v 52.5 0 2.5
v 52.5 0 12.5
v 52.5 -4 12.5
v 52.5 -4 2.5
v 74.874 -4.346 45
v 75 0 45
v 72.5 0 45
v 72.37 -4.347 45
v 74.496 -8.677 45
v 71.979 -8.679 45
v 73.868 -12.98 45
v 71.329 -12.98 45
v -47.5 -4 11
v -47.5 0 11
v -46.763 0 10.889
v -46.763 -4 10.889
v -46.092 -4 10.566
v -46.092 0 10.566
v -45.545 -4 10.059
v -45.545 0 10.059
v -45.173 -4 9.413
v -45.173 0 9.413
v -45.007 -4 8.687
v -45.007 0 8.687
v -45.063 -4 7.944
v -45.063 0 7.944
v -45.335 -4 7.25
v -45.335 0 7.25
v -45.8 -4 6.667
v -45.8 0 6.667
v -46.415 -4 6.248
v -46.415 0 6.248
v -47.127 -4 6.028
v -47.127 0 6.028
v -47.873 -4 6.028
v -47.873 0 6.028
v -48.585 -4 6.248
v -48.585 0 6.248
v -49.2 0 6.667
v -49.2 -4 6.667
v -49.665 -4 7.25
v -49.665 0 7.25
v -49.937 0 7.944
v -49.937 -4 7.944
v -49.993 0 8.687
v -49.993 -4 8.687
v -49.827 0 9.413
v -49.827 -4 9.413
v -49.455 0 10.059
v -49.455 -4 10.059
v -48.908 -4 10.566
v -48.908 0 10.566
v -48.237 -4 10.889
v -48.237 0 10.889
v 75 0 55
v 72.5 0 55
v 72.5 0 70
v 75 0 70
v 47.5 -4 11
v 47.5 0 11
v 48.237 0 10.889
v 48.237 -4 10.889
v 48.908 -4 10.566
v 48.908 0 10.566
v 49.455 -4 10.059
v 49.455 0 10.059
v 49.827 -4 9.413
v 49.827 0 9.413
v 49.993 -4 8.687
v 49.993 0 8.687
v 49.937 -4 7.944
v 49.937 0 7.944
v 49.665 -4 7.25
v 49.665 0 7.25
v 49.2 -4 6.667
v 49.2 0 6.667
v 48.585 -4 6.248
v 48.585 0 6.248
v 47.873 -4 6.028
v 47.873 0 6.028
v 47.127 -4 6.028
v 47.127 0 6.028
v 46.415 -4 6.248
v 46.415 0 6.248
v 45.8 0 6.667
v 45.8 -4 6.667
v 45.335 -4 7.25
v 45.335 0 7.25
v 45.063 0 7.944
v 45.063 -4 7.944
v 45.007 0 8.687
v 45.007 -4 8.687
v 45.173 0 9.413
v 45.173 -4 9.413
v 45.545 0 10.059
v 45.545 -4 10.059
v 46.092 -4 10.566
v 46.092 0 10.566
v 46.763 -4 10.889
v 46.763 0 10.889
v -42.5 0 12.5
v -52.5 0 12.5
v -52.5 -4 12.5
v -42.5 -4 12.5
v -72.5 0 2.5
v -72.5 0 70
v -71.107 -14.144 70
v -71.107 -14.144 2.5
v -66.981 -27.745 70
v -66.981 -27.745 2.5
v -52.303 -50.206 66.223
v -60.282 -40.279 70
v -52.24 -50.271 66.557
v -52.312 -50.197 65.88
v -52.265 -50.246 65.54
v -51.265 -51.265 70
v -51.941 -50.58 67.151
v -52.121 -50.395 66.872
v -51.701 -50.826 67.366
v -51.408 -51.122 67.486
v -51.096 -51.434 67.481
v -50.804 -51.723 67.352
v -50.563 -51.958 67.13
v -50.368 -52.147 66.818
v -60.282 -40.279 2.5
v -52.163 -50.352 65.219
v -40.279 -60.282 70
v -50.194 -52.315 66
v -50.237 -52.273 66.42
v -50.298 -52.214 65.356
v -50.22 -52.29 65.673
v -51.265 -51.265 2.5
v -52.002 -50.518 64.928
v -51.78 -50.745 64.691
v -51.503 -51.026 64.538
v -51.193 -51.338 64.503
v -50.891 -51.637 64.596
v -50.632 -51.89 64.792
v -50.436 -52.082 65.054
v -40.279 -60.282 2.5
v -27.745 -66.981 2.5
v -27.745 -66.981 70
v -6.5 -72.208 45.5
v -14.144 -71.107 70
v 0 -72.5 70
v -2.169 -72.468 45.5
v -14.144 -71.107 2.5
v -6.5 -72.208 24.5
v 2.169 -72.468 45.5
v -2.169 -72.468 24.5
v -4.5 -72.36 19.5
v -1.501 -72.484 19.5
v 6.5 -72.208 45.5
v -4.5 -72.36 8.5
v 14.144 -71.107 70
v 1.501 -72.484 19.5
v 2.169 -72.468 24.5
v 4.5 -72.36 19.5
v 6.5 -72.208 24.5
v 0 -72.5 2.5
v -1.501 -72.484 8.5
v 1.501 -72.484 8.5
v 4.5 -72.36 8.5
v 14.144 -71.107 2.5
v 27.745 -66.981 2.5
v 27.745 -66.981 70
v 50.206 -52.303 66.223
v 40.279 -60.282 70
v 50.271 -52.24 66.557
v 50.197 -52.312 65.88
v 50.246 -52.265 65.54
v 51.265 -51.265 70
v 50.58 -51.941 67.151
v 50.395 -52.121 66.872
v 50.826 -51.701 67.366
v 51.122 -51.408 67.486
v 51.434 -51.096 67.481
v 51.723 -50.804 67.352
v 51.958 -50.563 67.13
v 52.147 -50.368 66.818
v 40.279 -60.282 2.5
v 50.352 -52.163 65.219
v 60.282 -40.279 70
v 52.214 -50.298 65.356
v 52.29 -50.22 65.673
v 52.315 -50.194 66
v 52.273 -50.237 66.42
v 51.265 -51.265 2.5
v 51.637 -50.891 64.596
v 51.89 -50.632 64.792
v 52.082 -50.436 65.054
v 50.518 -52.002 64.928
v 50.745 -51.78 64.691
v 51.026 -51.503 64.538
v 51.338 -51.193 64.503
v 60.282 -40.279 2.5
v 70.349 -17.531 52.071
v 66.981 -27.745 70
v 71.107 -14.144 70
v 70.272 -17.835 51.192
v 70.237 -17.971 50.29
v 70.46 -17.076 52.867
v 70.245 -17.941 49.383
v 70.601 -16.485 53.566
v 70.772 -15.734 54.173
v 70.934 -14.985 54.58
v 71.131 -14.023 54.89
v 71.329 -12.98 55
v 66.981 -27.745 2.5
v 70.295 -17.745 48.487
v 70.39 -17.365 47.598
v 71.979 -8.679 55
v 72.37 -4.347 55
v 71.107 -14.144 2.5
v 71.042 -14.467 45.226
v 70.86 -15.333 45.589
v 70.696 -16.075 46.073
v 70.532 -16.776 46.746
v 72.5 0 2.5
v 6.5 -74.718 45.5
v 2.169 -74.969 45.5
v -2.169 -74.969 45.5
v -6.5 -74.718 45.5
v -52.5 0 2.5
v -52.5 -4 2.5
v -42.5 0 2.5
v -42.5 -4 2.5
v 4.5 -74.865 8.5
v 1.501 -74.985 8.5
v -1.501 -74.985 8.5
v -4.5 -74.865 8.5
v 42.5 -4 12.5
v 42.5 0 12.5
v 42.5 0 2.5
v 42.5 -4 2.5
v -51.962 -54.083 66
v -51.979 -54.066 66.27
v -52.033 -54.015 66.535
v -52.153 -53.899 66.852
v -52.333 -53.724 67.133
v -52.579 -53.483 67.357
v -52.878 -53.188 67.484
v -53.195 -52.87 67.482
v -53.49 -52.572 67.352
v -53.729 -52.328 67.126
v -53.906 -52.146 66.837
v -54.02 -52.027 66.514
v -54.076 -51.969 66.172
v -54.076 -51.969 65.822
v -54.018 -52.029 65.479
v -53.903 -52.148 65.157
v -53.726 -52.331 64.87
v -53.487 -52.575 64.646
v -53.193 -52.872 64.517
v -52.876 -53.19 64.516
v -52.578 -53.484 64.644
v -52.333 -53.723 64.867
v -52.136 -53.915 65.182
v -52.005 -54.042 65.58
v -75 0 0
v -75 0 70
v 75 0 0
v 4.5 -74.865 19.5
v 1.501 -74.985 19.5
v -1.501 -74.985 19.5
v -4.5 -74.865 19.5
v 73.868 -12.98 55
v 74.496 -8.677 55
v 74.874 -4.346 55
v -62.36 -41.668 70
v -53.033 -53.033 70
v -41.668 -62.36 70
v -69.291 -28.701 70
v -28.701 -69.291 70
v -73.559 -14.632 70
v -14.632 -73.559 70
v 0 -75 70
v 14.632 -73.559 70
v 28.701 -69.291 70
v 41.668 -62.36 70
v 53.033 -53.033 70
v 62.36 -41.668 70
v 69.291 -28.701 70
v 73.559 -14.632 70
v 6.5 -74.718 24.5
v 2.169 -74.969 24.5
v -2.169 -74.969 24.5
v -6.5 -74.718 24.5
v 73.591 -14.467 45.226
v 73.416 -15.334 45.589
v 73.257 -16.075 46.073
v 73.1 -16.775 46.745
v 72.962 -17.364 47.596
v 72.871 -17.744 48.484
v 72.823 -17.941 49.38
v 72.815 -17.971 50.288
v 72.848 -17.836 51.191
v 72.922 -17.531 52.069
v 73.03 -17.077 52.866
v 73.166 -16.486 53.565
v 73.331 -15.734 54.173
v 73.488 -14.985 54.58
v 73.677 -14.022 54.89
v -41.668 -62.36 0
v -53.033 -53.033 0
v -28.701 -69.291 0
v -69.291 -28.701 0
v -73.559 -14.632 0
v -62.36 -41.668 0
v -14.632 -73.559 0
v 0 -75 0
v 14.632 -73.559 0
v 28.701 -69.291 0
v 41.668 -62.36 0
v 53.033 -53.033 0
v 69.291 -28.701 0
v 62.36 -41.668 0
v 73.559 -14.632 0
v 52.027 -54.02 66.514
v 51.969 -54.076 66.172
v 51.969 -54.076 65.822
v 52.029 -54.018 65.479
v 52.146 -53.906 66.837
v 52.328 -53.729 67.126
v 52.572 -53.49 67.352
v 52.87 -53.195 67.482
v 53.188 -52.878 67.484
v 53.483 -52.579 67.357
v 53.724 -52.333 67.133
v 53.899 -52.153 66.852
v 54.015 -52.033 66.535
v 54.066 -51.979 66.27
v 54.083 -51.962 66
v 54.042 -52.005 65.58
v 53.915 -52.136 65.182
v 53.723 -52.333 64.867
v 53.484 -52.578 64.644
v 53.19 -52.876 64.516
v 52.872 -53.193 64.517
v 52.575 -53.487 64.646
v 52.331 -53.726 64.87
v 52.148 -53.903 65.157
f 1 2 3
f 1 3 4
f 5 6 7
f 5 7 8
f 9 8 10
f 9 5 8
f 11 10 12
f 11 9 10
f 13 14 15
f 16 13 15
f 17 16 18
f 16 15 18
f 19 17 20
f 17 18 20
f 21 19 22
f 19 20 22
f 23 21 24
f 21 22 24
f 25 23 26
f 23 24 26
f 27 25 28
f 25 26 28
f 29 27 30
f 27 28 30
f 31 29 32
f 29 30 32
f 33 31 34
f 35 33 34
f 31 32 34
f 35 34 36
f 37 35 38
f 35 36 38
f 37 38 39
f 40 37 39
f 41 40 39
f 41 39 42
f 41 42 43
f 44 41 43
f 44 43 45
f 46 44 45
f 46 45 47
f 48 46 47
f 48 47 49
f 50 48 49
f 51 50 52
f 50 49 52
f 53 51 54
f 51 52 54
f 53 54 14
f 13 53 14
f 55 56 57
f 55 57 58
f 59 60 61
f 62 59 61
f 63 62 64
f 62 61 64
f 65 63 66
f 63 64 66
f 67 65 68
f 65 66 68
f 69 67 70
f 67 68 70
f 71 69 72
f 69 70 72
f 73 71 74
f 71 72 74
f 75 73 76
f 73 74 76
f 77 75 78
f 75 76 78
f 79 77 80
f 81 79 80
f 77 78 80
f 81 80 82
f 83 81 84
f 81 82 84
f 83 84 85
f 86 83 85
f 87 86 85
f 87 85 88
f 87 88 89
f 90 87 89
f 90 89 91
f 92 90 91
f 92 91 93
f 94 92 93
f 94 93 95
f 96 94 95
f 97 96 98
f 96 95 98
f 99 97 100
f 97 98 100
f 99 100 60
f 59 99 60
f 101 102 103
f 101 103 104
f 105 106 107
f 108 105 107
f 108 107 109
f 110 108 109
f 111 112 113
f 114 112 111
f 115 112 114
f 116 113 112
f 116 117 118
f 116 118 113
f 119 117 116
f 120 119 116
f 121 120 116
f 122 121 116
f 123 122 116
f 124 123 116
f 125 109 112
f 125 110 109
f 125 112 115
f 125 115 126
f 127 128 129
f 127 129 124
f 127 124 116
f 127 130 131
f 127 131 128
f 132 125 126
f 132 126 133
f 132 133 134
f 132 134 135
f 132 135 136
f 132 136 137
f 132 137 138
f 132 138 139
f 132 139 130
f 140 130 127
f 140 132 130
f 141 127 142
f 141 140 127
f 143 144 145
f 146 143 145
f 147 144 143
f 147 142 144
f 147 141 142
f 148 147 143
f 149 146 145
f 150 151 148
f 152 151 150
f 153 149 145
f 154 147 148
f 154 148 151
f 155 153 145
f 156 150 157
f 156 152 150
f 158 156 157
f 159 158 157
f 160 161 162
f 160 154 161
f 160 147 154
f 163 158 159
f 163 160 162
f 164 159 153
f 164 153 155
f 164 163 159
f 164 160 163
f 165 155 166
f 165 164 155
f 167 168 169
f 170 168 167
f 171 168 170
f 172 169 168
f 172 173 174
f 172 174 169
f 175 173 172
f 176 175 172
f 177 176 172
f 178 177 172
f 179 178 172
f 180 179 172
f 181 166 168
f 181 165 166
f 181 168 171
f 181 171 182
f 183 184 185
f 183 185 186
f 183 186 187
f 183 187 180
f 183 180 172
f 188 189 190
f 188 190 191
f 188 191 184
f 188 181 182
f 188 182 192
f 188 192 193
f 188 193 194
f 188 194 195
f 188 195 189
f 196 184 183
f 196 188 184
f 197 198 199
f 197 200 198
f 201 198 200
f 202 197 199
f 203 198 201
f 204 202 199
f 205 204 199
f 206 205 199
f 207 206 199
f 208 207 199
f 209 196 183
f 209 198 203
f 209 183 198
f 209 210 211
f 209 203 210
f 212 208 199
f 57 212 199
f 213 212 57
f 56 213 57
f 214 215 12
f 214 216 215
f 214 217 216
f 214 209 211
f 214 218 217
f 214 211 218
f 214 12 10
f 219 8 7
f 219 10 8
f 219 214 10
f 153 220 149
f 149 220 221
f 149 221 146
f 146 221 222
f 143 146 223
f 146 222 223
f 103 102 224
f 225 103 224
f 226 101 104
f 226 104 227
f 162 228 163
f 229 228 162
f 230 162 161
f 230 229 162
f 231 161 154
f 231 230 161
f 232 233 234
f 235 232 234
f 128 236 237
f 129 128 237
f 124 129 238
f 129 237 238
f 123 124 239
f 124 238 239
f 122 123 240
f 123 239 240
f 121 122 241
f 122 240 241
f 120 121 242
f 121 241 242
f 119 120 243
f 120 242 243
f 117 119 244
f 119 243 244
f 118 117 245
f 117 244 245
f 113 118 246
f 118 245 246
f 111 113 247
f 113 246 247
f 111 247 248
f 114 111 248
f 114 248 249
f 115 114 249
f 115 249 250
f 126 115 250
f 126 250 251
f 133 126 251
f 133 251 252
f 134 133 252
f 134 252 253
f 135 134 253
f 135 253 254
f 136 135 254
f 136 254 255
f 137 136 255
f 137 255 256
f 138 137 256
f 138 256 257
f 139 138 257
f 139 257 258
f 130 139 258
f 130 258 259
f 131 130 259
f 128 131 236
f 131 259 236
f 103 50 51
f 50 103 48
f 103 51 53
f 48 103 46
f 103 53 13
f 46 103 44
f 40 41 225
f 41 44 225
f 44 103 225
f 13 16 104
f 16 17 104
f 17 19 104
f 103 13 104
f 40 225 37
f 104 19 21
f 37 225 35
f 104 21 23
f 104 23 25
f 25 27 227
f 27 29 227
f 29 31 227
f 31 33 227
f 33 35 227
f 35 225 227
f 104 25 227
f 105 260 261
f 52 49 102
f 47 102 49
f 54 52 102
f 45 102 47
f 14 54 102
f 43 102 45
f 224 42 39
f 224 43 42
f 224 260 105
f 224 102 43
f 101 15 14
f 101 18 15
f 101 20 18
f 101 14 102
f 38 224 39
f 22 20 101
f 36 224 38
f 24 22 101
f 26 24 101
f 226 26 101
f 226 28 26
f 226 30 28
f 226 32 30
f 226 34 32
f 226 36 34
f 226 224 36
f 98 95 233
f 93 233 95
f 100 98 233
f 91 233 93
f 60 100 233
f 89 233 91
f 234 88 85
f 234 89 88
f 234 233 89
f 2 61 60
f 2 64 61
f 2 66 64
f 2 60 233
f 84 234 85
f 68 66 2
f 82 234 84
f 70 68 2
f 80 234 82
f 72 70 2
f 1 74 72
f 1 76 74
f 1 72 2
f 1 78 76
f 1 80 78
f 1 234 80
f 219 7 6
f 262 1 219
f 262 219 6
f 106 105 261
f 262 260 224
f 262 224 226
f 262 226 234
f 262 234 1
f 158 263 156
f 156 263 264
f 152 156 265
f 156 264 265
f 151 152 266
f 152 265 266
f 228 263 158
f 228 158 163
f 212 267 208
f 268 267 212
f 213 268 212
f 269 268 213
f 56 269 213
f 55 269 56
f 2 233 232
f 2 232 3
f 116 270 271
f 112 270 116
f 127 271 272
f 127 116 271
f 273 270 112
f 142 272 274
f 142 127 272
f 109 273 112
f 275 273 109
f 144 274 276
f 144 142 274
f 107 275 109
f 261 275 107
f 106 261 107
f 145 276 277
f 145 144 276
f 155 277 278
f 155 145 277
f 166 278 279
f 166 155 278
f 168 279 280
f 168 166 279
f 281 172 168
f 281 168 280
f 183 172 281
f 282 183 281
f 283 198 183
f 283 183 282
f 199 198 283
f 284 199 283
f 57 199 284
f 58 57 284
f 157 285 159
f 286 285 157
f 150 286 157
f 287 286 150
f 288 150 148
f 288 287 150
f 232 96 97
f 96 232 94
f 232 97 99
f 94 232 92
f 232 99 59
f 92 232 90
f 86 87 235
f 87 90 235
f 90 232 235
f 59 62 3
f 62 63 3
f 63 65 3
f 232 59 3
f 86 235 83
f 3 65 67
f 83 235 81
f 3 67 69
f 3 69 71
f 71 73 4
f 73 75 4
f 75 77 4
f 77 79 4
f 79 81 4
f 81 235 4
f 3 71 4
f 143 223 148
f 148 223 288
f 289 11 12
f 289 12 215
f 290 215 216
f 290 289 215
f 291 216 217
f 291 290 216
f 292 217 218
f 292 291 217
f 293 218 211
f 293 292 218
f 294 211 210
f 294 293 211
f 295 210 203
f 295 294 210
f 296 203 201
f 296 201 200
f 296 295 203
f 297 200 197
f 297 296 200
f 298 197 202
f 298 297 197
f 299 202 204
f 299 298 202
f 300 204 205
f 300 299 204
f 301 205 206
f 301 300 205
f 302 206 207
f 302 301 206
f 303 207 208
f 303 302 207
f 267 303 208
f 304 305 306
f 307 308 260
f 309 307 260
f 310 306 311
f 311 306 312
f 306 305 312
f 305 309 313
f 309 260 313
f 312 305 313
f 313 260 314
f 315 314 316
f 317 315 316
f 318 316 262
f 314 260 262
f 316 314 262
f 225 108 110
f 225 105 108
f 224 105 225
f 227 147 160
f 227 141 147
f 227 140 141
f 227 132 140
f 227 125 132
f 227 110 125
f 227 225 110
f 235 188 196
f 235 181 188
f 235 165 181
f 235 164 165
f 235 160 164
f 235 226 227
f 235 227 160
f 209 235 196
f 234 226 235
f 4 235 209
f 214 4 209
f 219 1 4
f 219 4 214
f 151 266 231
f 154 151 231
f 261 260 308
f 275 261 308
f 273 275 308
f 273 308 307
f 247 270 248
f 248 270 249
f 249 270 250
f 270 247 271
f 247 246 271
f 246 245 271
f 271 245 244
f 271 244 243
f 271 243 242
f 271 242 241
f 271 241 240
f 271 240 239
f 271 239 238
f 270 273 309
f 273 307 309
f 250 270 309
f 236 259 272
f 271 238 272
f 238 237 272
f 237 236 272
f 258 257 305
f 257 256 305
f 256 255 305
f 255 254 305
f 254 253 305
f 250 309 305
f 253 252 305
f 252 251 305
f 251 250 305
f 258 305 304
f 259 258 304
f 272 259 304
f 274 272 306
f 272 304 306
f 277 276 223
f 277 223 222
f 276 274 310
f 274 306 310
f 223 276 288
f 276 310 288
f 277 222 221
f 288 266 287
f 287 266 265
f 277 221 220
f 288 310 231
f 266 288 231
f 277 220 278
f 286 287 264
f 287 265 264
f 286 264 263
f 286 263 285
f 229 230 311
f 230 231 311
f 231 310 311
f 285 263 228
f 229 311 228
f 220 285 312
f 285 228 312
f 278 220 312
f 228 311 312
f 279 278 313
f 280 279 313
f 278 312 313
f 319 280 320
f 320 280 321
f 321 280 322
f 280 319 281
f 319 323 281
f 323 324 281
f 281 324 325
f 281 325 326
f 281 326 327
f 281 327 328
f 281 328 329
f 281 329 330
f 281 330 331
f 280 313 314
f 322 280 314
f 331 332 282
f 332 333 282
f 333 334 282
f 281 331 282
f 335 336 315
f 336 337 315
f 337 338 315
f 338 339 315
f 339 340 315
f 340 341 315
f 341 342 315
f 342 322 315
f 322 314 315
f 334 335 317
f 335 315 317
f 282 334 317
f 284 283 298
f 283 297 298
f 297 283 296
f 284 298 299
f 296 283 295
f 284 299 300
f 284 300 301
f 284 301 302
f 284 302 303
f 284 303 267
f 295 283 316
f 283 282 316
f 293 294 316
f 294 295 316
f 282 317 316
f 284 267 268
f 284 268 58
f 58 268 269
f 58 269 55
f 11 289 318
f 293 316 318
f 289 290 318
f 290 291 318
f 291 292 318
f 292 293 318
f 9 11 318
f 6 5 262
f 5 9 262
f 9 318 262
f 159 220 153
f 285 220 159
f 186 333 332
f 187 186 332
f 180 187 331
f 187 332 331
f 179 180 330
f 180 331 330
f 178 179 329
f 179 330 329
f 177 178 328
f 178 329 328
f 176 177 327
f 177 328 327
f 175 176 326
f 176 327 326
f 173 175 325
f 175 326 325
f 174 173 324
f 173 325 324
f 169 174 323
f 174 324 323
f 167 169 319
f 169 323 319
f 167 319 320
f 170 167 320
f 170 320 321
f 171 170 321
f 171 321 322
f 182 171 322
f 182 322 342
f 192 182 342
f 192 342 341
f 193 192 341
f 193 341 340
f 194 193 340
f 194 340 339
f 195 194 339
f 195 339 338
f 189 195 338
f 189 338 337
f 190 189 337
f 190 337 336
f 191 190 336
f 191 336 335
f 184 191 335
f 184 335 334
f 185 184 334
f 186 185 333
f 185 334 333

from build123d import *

# Parameters (mm, degrees)
SZKIC1_R                         = 75
DODANIE_WYCI_GNI_CIE1_DEPTH      = 70
SKORUPA1_T                       = -2.5
SZKIC3_W                         = 13
SZKIC3_H                         = 21
WYTNIJ_WYCI_GNI_CIE1_DEPTH       = 60
SZKIC4_W                         = 9
SZKIC4_H                         = 11
WYTNIJ_WYCI_GNI_CIE2_DEPTH       = 60
DODANIE_WYCI_GNI_CIE2_REACH      = 192.066
DODANIE_WYCI_GNI_CIE2_END_RADIUS = 75
SZKIC7_W                         = 60
SZKIC7_H                         = 35
SZKIC8_W                         = 45.5
SZKIC8_H                         = 26.5
WYTNIJ_WYCI_GNI_CIE4_DEPTH       = 30
ZAOKR_GLENIE1_R                  = 5
WYTNIJ_WYCI_GNI_CIE5_DEPTH       = 14
SZKIC10_R                        = 1.5
WYTNIJ_WYCI_GNI_CIE6_DEPTH       = 10
SZYK_KO_OWY1_COUNT               = 4
PRZECI_CIE2_OUTLINE_W            = 152
PRZECI_CIE2_OUTLINE_H            = 70
PRZECI_CIE2_OUTLINE_W_2          = 45.5
PRZECI_CIE2_OUTLINE_H_2          = 26.5
PRZECI_CIE2_DEPTH                = 85
SZKIC11_W                        = 10
SZKIC11_H                        = 10
SZKIC11_R                        = 2.5
DODANIE_WYCI_GNI_CIE3_DEPTH      = 4


# Read off the part's stored shape, not the designer's step: Przecięcie2
with BuildPart() as part:
    # Szkic1 → Dodanie-wyciągnięcie1 (new body)
    with BuildSketch(Plane.XY):
        Circle(SZKIC1_R)
    extrude(amount=DODANIE_WYCI_GNI_CIE1_DEPTH)

    # Skorupa1
    skorupa1_openings = [part.faces().sort_by_distance(p)[0] for p in [
        (0, 0, 70),
    ]]
    offset(amount=SKORUPA1_T, openings=skorupa1_openings, kind=Kind.INTERSECTION)

    # Szkic3 → Wytnij-wyciągnięcie1 (cut)
    with BuildSketch(Plane(origin=(0, -75, 0), x_dir=(-1, 0, 0), z_dir=(0, -1, 0))):
        with Locations((0, -35)):
            Rectangle(SZKIC3_W, SZKIC3_H)
    extrude(amount=-WYTNIJ_WYCI_GNI_CIE1_DEPTH, mode=Mode.SUBTRACT)

    # Szkic4 → Wytnij-wyciągnięcie2 (cut)
    with BuildSketch(Plane(origin=(0, -75, 0), x_dir=(-1, 0, 0), z_dir=(0, -1, 0))):
        with Locations((0, -14)):
            Rectangle(SZKIC4_W, SZKIC4_H)
    extrude(amount=-WYTNIJ_WYCI_GNI_CIE2_DEPTH, mode=Mode.SUBTRACT)

    # Dodanie-wyciągnięcie2: up to this cylinder (the profile starts outside it)
    dodanie_wyci_gni_cie2_end = Plane(origin=(0, 0, 35.532003), z_dir=(0, 0, -1)) * Cylinder(DODANIE_WYCI_GNI_CIE2_END_RADIUS, 535.132, mode=Mode.PRIVATE)
    # Szkic7 → Dodanie-wyciągnięcie2 (add, up to the surface)
    with BuildSketch(Plane(origin=(0, 85, 0), x_dir=(-1, 0, 0), z_dir=(0, -1, 0)), mode=Mode.PRIVATE) as dodanie_wyci_gni_cie2_sk1:
        with Locations((0, -35.532003496)):
            Rectangle(SZKIC7_W, SZKIC7_H)
    dodanie_wyci_gni_cie2_tool1 = extrude(dodanie_wyci_gni_cie2_sk1.sketch, amount=DODANIE_WYCI_GNI_CIE2_REACH, mode=Mode.PRIVATE) - dodanie_wyci_gni_cie2_end
    add(dodanie_wyci_gni_cie2_tool1.solids().sort_by_distance((0, 85, 35.532003))[0])

    # Szkic8 → Wytnij-wyciągnięcie4 (cut)
    with BuildSketch(Plane(origin=(0, 85, 0), x_dir=(1, 0, 0), z_dir=(0, 1, 0))):
        with Locations((0, -35.532003496)):
            Rectangle(SZKIC8_W, SZKIC8_H)
    extrude(amount=-WYTNIJ_WYCI_GNI_CIE4_DEPTH, mode=Mode.SUBTRACT)

    # Zaokrąglenie1
    zaokr_glenie1_edges = [part.edges().sort_by_distance(p)[0] for p in [
        (-30, 76.869317712, 18.032003496),
        (-30, 76.869317712, 53.032003496),
        (30, 76.869317712, 18.032003496),
        (30, 76.869317712, 53.032003496),
    ]]
    fillet(zaokr_glenie1_edges, radius=ZAOKR_GLENIE1_R)

    # Szkic9 → Wytnij-wyciągnięcie5 (cut)
    with BuildSketch(Plane(origin=(75, 0, 0), x_dir=(0, 0, -1), z_dir=(1, 0, 0))):
        with BuildLine():
            Line((-55, -12.979686846), (-55, 12.020313154))
            ThreePointArc((-55, 12.020313154), (-50, 17.020313154), (-45, 12.020313154))
            Line((-45, 12.020313154), (-45, -12.979686846))
            ThreePointArc((-45, -12.979686846), (-50, -17.979686846), (-55, -12.979686846))
        make_face()
    extrude(amount=-WYTNIJ_WYCI_GNI_CIE5_DEPTH, mode=Mode.SUBTRACT)

    # Szkic10 → Wytnij-wyciągnięcie6 (cut)
    with BuildSketch(Plane(origin=(53.033008589, 53.033008589, 0), x_dir=(0, 0, -1), z_dir=(0.7071067811865512, 0.7071067811865438, 0))):
        with Locations(Location((-66, 0, 0), (0, 0, 90))):
            Circle(SZKIC10_R)
    wytnij_wyci_gni_cie6 = extrude(amount=-WYTNIJ_WYCI_GNI_CIE6_DEPTH, mode=Mode.SUBTRACT)

    # Szyk kołowy1: Wytnij-wyciągnięcie6 ×4 about axis
    szyk_ko_owy1_axis = Axis((0, 0, 70), (0, 0, -1))
    for i in range(1, SZYK_KO_OWY1_COUNT):
        add(wytnij_wyci_gni_cie6.rotate(szyk_ko_owy1_axis, i * 360 / SZYK_KO_OWY1_COUNT), mode=Mode.SUBTRACT)

    # Przecięcie2 outline → Przecięcie2 (cut)
    with BuildSketch(Plane(origin=(0, 0, 0), x_dir=(1, 0, 0), z_dir=(0, 1, 0))):
        with Locations((0, -35)):
            Rectangle(PRZECI_CIE2_OUTLINE_W, PRZECI_CIE2_OUTLINE_H)
        with Locations((0, -35.532003496)):
            Rectangle(PRZECI_CIE2_OUTLINE_W_2, PRZECI_CIE2_OUTLINE_H_2, mode=Mode.SUBTRACT)
    extrude(amount=PRZECI_CIE2_DEPTH, mode=Mode.SUBTRACT)

    # Szkic11 → Dodanie-wyciągnięcie3 (add)
    # profile 1 of 2: a face of its own
    with BuildSketch(Plane(origin=(0, 0, 0), x_dir=(1, 0, 0), z_dir=(0, 1, 0))):
        with Locations((47.5, -7.5)):
            Rectangle(SZKIC11_W, SZKIC11_H)
        with Locations(Location((47.5, -8.5, 0), (0, 0, 270))):
            Circle(SZKIC11_R, mode=Mode.SUBTRACT)
    # profile 2 of 2: a face of its own
    with BuildSketch(Plane(origin=(0, 0, 0), x_dir=(1, 0, 0), z_dir=(0, 1, 0))):
        with Locations((-47.5, -7.5)):
            Rectangle(SZKIC11_W, SZKIC11_H)
        with Locations(Location((-47.5, -8.5, 0), (0, 0, 270))):
            Circle(SZKIC11_R, mode=Mode.SUBTRACT)
    extrude(amount=-DODANIE_WYCI_GNI_CIE3_DEPTH)


solid = part.part
